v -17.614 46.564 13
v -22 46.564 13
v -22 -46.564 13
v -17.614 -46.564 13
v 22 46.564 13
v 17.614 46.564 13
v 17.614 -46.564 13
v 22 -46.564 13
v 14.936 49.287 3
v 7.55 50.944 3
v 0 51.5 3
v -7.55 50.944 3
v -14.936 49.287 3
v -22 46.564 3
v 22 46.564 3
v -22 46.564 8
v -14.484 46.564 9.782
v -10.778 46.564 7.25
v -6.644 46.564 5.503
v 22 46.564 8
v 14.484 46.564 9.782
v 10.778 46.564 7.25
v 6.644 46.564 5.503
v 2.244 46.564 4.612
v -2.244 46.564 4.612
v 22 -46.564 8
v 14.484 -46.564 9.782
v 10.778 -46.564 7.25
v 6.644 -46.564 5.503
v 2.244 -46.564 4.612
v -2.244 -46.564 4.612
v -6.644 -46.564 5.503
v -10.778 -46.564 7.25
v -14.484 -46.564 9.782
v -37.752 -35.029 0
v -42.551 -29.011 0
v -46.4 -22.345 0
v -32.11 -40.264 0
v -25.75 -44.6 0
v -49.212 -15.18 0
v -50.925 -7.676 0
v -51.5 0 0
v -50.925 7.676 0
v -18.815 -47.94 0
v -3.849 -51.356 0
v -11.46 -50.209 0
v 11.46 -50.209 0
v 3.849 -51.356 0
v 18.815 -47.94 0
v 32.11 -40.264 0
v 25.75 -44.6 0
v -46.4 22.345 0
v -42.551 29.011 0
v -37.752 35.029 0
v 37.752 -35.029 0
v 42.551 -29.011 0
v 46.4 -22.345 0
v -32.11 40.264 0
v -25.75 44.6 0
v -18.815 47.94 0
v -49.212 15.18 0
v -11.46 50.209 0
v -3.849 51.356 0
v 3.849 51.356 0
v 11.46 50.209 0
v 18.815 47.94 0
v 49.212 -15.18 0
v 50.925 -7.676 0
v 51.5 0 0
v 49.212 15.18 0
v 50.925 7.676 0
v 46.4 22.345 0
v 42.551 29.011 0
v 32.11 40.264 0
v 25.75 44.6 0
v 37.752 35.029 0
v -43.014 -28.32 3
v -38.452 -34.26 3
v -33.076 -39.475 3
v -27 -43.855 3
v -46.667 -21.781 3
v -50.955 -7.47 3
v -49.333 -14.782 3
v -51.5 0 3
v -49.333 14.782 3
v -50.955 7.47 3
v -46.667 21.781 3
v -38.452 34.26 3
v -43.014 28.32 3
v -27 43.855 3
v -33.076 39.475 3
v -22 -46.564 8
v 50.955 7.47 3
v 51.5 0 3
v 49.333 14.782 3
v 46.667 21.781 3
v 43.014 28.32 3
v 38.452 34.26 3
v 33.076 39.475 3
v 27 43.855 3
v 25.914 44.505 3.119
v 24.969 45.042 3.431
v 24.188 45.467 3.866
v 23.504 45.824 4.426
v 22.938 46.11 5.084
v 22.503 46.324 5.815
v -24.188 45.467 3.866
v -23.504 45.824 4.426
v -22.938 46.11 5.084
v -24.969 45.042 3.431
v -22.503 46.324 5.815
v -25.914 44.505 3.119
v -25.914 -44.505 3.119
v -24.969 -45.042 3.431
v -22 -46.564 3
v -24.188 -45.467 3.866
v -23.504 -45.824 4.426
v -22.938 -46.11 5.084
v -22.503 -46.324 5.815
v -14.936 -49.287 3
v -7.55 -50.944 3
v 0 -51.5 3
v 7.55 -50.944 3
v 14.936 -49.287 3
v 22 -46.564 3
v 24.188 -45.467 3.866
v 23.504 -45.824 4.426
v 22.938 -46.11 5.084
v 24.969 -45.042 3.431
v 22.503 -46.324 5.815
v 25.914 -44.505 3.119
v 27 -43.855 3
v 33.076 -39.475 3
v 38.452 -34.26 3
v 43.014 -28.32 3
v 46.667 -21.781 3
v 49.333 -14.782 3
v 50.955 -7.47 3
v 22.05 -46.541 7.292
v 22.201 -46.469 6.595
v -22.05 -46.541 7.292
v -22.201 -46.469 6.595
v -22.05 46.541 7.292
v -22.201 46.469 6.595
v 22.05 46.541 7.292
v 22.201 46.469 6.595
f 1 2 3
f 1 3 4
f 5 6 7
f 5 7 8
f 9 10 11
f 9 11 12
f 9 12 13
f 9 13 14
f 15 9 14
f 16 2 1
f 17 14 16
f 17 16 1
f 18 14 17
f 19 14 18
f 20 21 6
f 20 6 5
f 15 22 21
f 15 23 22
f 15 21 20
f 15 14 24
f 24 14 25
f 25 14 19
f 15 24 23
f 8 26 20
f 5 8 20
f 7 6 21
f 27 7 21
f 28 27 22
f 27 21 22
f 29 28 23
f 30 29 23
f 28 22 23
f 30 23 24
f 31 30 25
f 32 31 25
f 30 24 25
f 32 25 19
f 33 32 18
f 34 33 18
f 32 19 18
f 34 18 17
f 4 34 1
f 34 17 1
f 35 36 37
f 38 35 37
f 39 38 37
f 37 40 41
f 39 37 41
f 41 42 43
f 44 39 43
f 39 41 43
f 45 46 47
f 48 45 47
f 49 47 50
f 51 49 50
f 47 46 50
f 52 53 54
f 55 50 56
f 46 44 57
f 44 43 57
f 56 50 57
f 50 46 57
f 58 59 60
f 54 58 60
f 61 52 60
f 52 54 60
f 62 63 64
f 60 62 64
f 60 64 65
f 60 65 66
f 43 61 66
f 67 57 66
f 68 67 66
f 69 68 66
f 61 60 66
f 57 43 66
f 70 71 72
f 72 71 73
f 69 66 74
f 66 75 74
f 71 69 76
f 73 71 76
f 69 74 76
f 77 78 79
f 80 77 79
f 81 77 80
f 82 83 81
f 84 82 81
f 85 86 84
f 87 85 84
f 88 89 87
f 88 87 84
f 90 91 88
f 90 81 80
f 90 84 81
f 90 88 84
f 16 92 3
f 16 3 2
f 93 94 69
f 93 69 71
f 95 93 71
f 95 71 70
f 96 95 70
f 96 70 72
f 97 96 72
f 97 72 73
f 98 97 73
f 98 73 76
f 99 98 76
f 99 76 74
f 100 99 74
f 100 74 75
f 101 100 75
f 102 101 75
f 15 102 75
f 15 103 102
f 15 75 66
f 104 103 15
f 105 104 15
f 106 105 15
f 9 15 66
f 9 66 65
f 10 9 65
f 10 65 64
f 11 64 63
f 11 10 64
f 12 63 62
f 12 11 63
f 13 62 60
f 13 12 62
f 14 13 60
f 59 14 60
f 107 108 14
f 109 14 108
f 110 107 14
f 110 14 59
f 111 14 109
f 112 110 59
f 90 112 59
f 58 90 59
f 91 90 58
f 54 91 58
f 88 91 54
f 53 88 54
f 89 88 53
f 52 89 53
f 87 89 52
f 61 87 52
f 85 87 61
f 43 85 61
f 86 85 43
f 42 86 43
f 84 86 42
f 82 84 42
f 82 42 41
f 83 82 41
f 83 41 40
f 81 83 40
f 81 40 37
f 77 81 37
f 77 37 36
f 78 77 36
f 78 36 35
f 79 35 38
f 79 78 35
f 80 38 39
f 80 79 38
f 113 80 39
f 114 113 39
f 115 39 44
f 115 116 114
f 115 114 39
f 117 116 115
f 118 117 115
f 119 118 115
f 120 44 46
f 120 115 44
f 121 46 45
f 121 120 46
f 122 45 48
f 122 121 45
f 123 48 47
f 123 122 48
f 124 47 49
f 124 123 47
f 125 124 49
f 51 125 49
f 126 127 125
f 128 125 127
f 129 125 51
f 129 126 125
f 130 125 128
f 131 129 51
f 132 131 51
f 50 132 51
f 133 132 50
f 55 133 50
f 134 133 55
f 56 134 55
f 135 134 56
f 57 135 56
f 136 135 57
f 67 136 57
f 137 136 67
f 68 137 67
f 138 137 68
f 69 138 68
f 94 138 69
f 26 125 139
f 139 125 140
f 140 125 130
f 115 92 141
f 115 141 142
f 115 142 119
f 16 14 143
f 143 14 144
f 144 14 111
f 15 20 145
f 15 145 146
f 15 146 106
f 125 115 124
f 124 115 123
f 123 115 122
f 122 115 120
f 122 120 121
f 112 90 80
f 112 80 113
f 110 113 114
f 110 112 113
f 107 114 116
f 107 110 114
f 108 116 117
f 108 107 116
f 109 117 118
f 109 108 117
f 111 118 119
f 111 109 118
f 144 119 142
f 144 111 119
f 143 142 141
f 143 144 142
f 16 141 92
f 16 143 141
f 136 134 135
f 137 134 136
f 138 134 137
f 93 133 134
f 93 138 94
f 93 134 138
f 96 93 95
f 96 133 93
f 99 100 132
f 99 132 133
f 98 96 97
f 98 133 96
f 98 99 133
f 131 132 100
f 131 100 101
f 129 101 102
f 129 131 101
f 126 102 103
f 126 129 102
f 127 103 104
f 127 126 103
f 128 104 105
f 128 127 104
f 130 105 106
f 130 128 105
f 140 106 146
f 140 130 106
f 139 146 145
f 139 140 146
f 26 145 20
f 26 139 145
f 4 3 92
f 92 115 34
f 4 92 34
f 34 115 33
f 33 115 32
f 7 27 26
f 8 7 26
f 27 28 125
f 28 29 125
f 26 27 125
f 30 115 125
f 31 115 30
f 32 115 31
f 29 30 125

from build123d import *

# Parameters (mm, degrees)
F0_R        = 51.5
F1_DEPTH    = 3
F2_W        = 44
F2_H        = 93.1289428696
F3_DEPTH    = 10
F5_DEPTH    = 93.1289428696
F6_T4_DEPTH = 93.1289428696
F6_S5_R     = 51.5
F6_T6_DEPTH = 48
F7_T4_DEPTH = 93.1289428696
F7_S5_R     = 51.5
F7_T6_DEPTH = 48


# Not quite as in the source:
# - a fillet or chamfer that OpenCascade refuses, or shapes differently, is made with other operations: its cross-section is extruded or revolved along the edge and cut away or added


with BuildPart() as f1:
    # F0 (on Top) → F1 (new body)
    with BuildSketch(Plane.XY):
        Circle(F0_R)
    extrude(amount=F1_DEPTH)

    # F2 (on face) → F3 (join)
    with BuildSketch(Plane.XY.offset(3)):
        Rectangle(F2_W, F2_H)
    extrude(amount=F3_DEPTH)

    # F4 (on face) → F5 (cut, through all)
    with BuildSketch(Plane(origin=(0, 46.5644714348, 0), x_dir=(-1, 0, 0), z_dir=(0, 1, 0))):
        with BuildLine():
            Line((17.6139149538, 13), (-17.6139149538, 13))
            ThreePointArc((-17.6139149538, 13), (0, 4.5), (17.6139149538, 13))
        make_face()
    extrude(amount=-F5_DEPTH, mode=Mode.SUBTRACT)

    # F6: fillet of radius 5 on 1 edges, made by hand


with BuildPart() as f6_tool2:
    # F6_s3 → F6_t4 (new body)
    with BuildSketch(Plane.XZ.offset(-46.5644714348)):
        with BuildLine():
            ThreePointArc((-27, 3), (-23.4644660941, 4.4644660941), (-22, 8))
            Line((-22, 8), (-22, 3))
            Line((-22, 3), (-27, 3))
        make_face()
    extrude(amount=F6_T4_DEPTH)

    # F6_s5 → F6_t6 (intersect, symmetric)
    with BuildSketch(Plane.XY.offset(5.5)):
        Circle(F6_S5_R)
    extrude(amount=F6_T6_DEPTH, both=True, mode=Mode.INTERSECT)


with BuildPart() as f1_1:
    add(f1.part)

    # F6_t1: union F6_tool2
    add(f6_tool2.part)

    # F7: fillet of radius 5 on 1 edges, made by hand


with BuildPart() as f7_tool2:
    # F7_s3 → F7_t4 (new body)
    with BuildSketch(Plane.XZ.offset(46.5644714348)):
        with BuildLine():
            ThreePointArc((27, 3), (23.4644660941, 4.4644660941), (22, 8))
            Line((22, 8), (22, 3))
            Line((22, 3), (27, 3))
        make_face()
    extrude(amount=-F7_T4_DEPTH)

    # F7_s5 → F7_t6 (intersect, symmetric)
    with BuildSketch(Plane.XY.offset(5.5)):
        Circle(F7_S5_R)
    extrude(amount=F7_T6_DEPTH, both=True, mode=Mode.INTERSECT)


with BuildPart() as f1_2:
    add(f1_1.part)

    # F7_t1: union F7_tool2
    add(f7_tool2.part)


solid = f1_2.part
